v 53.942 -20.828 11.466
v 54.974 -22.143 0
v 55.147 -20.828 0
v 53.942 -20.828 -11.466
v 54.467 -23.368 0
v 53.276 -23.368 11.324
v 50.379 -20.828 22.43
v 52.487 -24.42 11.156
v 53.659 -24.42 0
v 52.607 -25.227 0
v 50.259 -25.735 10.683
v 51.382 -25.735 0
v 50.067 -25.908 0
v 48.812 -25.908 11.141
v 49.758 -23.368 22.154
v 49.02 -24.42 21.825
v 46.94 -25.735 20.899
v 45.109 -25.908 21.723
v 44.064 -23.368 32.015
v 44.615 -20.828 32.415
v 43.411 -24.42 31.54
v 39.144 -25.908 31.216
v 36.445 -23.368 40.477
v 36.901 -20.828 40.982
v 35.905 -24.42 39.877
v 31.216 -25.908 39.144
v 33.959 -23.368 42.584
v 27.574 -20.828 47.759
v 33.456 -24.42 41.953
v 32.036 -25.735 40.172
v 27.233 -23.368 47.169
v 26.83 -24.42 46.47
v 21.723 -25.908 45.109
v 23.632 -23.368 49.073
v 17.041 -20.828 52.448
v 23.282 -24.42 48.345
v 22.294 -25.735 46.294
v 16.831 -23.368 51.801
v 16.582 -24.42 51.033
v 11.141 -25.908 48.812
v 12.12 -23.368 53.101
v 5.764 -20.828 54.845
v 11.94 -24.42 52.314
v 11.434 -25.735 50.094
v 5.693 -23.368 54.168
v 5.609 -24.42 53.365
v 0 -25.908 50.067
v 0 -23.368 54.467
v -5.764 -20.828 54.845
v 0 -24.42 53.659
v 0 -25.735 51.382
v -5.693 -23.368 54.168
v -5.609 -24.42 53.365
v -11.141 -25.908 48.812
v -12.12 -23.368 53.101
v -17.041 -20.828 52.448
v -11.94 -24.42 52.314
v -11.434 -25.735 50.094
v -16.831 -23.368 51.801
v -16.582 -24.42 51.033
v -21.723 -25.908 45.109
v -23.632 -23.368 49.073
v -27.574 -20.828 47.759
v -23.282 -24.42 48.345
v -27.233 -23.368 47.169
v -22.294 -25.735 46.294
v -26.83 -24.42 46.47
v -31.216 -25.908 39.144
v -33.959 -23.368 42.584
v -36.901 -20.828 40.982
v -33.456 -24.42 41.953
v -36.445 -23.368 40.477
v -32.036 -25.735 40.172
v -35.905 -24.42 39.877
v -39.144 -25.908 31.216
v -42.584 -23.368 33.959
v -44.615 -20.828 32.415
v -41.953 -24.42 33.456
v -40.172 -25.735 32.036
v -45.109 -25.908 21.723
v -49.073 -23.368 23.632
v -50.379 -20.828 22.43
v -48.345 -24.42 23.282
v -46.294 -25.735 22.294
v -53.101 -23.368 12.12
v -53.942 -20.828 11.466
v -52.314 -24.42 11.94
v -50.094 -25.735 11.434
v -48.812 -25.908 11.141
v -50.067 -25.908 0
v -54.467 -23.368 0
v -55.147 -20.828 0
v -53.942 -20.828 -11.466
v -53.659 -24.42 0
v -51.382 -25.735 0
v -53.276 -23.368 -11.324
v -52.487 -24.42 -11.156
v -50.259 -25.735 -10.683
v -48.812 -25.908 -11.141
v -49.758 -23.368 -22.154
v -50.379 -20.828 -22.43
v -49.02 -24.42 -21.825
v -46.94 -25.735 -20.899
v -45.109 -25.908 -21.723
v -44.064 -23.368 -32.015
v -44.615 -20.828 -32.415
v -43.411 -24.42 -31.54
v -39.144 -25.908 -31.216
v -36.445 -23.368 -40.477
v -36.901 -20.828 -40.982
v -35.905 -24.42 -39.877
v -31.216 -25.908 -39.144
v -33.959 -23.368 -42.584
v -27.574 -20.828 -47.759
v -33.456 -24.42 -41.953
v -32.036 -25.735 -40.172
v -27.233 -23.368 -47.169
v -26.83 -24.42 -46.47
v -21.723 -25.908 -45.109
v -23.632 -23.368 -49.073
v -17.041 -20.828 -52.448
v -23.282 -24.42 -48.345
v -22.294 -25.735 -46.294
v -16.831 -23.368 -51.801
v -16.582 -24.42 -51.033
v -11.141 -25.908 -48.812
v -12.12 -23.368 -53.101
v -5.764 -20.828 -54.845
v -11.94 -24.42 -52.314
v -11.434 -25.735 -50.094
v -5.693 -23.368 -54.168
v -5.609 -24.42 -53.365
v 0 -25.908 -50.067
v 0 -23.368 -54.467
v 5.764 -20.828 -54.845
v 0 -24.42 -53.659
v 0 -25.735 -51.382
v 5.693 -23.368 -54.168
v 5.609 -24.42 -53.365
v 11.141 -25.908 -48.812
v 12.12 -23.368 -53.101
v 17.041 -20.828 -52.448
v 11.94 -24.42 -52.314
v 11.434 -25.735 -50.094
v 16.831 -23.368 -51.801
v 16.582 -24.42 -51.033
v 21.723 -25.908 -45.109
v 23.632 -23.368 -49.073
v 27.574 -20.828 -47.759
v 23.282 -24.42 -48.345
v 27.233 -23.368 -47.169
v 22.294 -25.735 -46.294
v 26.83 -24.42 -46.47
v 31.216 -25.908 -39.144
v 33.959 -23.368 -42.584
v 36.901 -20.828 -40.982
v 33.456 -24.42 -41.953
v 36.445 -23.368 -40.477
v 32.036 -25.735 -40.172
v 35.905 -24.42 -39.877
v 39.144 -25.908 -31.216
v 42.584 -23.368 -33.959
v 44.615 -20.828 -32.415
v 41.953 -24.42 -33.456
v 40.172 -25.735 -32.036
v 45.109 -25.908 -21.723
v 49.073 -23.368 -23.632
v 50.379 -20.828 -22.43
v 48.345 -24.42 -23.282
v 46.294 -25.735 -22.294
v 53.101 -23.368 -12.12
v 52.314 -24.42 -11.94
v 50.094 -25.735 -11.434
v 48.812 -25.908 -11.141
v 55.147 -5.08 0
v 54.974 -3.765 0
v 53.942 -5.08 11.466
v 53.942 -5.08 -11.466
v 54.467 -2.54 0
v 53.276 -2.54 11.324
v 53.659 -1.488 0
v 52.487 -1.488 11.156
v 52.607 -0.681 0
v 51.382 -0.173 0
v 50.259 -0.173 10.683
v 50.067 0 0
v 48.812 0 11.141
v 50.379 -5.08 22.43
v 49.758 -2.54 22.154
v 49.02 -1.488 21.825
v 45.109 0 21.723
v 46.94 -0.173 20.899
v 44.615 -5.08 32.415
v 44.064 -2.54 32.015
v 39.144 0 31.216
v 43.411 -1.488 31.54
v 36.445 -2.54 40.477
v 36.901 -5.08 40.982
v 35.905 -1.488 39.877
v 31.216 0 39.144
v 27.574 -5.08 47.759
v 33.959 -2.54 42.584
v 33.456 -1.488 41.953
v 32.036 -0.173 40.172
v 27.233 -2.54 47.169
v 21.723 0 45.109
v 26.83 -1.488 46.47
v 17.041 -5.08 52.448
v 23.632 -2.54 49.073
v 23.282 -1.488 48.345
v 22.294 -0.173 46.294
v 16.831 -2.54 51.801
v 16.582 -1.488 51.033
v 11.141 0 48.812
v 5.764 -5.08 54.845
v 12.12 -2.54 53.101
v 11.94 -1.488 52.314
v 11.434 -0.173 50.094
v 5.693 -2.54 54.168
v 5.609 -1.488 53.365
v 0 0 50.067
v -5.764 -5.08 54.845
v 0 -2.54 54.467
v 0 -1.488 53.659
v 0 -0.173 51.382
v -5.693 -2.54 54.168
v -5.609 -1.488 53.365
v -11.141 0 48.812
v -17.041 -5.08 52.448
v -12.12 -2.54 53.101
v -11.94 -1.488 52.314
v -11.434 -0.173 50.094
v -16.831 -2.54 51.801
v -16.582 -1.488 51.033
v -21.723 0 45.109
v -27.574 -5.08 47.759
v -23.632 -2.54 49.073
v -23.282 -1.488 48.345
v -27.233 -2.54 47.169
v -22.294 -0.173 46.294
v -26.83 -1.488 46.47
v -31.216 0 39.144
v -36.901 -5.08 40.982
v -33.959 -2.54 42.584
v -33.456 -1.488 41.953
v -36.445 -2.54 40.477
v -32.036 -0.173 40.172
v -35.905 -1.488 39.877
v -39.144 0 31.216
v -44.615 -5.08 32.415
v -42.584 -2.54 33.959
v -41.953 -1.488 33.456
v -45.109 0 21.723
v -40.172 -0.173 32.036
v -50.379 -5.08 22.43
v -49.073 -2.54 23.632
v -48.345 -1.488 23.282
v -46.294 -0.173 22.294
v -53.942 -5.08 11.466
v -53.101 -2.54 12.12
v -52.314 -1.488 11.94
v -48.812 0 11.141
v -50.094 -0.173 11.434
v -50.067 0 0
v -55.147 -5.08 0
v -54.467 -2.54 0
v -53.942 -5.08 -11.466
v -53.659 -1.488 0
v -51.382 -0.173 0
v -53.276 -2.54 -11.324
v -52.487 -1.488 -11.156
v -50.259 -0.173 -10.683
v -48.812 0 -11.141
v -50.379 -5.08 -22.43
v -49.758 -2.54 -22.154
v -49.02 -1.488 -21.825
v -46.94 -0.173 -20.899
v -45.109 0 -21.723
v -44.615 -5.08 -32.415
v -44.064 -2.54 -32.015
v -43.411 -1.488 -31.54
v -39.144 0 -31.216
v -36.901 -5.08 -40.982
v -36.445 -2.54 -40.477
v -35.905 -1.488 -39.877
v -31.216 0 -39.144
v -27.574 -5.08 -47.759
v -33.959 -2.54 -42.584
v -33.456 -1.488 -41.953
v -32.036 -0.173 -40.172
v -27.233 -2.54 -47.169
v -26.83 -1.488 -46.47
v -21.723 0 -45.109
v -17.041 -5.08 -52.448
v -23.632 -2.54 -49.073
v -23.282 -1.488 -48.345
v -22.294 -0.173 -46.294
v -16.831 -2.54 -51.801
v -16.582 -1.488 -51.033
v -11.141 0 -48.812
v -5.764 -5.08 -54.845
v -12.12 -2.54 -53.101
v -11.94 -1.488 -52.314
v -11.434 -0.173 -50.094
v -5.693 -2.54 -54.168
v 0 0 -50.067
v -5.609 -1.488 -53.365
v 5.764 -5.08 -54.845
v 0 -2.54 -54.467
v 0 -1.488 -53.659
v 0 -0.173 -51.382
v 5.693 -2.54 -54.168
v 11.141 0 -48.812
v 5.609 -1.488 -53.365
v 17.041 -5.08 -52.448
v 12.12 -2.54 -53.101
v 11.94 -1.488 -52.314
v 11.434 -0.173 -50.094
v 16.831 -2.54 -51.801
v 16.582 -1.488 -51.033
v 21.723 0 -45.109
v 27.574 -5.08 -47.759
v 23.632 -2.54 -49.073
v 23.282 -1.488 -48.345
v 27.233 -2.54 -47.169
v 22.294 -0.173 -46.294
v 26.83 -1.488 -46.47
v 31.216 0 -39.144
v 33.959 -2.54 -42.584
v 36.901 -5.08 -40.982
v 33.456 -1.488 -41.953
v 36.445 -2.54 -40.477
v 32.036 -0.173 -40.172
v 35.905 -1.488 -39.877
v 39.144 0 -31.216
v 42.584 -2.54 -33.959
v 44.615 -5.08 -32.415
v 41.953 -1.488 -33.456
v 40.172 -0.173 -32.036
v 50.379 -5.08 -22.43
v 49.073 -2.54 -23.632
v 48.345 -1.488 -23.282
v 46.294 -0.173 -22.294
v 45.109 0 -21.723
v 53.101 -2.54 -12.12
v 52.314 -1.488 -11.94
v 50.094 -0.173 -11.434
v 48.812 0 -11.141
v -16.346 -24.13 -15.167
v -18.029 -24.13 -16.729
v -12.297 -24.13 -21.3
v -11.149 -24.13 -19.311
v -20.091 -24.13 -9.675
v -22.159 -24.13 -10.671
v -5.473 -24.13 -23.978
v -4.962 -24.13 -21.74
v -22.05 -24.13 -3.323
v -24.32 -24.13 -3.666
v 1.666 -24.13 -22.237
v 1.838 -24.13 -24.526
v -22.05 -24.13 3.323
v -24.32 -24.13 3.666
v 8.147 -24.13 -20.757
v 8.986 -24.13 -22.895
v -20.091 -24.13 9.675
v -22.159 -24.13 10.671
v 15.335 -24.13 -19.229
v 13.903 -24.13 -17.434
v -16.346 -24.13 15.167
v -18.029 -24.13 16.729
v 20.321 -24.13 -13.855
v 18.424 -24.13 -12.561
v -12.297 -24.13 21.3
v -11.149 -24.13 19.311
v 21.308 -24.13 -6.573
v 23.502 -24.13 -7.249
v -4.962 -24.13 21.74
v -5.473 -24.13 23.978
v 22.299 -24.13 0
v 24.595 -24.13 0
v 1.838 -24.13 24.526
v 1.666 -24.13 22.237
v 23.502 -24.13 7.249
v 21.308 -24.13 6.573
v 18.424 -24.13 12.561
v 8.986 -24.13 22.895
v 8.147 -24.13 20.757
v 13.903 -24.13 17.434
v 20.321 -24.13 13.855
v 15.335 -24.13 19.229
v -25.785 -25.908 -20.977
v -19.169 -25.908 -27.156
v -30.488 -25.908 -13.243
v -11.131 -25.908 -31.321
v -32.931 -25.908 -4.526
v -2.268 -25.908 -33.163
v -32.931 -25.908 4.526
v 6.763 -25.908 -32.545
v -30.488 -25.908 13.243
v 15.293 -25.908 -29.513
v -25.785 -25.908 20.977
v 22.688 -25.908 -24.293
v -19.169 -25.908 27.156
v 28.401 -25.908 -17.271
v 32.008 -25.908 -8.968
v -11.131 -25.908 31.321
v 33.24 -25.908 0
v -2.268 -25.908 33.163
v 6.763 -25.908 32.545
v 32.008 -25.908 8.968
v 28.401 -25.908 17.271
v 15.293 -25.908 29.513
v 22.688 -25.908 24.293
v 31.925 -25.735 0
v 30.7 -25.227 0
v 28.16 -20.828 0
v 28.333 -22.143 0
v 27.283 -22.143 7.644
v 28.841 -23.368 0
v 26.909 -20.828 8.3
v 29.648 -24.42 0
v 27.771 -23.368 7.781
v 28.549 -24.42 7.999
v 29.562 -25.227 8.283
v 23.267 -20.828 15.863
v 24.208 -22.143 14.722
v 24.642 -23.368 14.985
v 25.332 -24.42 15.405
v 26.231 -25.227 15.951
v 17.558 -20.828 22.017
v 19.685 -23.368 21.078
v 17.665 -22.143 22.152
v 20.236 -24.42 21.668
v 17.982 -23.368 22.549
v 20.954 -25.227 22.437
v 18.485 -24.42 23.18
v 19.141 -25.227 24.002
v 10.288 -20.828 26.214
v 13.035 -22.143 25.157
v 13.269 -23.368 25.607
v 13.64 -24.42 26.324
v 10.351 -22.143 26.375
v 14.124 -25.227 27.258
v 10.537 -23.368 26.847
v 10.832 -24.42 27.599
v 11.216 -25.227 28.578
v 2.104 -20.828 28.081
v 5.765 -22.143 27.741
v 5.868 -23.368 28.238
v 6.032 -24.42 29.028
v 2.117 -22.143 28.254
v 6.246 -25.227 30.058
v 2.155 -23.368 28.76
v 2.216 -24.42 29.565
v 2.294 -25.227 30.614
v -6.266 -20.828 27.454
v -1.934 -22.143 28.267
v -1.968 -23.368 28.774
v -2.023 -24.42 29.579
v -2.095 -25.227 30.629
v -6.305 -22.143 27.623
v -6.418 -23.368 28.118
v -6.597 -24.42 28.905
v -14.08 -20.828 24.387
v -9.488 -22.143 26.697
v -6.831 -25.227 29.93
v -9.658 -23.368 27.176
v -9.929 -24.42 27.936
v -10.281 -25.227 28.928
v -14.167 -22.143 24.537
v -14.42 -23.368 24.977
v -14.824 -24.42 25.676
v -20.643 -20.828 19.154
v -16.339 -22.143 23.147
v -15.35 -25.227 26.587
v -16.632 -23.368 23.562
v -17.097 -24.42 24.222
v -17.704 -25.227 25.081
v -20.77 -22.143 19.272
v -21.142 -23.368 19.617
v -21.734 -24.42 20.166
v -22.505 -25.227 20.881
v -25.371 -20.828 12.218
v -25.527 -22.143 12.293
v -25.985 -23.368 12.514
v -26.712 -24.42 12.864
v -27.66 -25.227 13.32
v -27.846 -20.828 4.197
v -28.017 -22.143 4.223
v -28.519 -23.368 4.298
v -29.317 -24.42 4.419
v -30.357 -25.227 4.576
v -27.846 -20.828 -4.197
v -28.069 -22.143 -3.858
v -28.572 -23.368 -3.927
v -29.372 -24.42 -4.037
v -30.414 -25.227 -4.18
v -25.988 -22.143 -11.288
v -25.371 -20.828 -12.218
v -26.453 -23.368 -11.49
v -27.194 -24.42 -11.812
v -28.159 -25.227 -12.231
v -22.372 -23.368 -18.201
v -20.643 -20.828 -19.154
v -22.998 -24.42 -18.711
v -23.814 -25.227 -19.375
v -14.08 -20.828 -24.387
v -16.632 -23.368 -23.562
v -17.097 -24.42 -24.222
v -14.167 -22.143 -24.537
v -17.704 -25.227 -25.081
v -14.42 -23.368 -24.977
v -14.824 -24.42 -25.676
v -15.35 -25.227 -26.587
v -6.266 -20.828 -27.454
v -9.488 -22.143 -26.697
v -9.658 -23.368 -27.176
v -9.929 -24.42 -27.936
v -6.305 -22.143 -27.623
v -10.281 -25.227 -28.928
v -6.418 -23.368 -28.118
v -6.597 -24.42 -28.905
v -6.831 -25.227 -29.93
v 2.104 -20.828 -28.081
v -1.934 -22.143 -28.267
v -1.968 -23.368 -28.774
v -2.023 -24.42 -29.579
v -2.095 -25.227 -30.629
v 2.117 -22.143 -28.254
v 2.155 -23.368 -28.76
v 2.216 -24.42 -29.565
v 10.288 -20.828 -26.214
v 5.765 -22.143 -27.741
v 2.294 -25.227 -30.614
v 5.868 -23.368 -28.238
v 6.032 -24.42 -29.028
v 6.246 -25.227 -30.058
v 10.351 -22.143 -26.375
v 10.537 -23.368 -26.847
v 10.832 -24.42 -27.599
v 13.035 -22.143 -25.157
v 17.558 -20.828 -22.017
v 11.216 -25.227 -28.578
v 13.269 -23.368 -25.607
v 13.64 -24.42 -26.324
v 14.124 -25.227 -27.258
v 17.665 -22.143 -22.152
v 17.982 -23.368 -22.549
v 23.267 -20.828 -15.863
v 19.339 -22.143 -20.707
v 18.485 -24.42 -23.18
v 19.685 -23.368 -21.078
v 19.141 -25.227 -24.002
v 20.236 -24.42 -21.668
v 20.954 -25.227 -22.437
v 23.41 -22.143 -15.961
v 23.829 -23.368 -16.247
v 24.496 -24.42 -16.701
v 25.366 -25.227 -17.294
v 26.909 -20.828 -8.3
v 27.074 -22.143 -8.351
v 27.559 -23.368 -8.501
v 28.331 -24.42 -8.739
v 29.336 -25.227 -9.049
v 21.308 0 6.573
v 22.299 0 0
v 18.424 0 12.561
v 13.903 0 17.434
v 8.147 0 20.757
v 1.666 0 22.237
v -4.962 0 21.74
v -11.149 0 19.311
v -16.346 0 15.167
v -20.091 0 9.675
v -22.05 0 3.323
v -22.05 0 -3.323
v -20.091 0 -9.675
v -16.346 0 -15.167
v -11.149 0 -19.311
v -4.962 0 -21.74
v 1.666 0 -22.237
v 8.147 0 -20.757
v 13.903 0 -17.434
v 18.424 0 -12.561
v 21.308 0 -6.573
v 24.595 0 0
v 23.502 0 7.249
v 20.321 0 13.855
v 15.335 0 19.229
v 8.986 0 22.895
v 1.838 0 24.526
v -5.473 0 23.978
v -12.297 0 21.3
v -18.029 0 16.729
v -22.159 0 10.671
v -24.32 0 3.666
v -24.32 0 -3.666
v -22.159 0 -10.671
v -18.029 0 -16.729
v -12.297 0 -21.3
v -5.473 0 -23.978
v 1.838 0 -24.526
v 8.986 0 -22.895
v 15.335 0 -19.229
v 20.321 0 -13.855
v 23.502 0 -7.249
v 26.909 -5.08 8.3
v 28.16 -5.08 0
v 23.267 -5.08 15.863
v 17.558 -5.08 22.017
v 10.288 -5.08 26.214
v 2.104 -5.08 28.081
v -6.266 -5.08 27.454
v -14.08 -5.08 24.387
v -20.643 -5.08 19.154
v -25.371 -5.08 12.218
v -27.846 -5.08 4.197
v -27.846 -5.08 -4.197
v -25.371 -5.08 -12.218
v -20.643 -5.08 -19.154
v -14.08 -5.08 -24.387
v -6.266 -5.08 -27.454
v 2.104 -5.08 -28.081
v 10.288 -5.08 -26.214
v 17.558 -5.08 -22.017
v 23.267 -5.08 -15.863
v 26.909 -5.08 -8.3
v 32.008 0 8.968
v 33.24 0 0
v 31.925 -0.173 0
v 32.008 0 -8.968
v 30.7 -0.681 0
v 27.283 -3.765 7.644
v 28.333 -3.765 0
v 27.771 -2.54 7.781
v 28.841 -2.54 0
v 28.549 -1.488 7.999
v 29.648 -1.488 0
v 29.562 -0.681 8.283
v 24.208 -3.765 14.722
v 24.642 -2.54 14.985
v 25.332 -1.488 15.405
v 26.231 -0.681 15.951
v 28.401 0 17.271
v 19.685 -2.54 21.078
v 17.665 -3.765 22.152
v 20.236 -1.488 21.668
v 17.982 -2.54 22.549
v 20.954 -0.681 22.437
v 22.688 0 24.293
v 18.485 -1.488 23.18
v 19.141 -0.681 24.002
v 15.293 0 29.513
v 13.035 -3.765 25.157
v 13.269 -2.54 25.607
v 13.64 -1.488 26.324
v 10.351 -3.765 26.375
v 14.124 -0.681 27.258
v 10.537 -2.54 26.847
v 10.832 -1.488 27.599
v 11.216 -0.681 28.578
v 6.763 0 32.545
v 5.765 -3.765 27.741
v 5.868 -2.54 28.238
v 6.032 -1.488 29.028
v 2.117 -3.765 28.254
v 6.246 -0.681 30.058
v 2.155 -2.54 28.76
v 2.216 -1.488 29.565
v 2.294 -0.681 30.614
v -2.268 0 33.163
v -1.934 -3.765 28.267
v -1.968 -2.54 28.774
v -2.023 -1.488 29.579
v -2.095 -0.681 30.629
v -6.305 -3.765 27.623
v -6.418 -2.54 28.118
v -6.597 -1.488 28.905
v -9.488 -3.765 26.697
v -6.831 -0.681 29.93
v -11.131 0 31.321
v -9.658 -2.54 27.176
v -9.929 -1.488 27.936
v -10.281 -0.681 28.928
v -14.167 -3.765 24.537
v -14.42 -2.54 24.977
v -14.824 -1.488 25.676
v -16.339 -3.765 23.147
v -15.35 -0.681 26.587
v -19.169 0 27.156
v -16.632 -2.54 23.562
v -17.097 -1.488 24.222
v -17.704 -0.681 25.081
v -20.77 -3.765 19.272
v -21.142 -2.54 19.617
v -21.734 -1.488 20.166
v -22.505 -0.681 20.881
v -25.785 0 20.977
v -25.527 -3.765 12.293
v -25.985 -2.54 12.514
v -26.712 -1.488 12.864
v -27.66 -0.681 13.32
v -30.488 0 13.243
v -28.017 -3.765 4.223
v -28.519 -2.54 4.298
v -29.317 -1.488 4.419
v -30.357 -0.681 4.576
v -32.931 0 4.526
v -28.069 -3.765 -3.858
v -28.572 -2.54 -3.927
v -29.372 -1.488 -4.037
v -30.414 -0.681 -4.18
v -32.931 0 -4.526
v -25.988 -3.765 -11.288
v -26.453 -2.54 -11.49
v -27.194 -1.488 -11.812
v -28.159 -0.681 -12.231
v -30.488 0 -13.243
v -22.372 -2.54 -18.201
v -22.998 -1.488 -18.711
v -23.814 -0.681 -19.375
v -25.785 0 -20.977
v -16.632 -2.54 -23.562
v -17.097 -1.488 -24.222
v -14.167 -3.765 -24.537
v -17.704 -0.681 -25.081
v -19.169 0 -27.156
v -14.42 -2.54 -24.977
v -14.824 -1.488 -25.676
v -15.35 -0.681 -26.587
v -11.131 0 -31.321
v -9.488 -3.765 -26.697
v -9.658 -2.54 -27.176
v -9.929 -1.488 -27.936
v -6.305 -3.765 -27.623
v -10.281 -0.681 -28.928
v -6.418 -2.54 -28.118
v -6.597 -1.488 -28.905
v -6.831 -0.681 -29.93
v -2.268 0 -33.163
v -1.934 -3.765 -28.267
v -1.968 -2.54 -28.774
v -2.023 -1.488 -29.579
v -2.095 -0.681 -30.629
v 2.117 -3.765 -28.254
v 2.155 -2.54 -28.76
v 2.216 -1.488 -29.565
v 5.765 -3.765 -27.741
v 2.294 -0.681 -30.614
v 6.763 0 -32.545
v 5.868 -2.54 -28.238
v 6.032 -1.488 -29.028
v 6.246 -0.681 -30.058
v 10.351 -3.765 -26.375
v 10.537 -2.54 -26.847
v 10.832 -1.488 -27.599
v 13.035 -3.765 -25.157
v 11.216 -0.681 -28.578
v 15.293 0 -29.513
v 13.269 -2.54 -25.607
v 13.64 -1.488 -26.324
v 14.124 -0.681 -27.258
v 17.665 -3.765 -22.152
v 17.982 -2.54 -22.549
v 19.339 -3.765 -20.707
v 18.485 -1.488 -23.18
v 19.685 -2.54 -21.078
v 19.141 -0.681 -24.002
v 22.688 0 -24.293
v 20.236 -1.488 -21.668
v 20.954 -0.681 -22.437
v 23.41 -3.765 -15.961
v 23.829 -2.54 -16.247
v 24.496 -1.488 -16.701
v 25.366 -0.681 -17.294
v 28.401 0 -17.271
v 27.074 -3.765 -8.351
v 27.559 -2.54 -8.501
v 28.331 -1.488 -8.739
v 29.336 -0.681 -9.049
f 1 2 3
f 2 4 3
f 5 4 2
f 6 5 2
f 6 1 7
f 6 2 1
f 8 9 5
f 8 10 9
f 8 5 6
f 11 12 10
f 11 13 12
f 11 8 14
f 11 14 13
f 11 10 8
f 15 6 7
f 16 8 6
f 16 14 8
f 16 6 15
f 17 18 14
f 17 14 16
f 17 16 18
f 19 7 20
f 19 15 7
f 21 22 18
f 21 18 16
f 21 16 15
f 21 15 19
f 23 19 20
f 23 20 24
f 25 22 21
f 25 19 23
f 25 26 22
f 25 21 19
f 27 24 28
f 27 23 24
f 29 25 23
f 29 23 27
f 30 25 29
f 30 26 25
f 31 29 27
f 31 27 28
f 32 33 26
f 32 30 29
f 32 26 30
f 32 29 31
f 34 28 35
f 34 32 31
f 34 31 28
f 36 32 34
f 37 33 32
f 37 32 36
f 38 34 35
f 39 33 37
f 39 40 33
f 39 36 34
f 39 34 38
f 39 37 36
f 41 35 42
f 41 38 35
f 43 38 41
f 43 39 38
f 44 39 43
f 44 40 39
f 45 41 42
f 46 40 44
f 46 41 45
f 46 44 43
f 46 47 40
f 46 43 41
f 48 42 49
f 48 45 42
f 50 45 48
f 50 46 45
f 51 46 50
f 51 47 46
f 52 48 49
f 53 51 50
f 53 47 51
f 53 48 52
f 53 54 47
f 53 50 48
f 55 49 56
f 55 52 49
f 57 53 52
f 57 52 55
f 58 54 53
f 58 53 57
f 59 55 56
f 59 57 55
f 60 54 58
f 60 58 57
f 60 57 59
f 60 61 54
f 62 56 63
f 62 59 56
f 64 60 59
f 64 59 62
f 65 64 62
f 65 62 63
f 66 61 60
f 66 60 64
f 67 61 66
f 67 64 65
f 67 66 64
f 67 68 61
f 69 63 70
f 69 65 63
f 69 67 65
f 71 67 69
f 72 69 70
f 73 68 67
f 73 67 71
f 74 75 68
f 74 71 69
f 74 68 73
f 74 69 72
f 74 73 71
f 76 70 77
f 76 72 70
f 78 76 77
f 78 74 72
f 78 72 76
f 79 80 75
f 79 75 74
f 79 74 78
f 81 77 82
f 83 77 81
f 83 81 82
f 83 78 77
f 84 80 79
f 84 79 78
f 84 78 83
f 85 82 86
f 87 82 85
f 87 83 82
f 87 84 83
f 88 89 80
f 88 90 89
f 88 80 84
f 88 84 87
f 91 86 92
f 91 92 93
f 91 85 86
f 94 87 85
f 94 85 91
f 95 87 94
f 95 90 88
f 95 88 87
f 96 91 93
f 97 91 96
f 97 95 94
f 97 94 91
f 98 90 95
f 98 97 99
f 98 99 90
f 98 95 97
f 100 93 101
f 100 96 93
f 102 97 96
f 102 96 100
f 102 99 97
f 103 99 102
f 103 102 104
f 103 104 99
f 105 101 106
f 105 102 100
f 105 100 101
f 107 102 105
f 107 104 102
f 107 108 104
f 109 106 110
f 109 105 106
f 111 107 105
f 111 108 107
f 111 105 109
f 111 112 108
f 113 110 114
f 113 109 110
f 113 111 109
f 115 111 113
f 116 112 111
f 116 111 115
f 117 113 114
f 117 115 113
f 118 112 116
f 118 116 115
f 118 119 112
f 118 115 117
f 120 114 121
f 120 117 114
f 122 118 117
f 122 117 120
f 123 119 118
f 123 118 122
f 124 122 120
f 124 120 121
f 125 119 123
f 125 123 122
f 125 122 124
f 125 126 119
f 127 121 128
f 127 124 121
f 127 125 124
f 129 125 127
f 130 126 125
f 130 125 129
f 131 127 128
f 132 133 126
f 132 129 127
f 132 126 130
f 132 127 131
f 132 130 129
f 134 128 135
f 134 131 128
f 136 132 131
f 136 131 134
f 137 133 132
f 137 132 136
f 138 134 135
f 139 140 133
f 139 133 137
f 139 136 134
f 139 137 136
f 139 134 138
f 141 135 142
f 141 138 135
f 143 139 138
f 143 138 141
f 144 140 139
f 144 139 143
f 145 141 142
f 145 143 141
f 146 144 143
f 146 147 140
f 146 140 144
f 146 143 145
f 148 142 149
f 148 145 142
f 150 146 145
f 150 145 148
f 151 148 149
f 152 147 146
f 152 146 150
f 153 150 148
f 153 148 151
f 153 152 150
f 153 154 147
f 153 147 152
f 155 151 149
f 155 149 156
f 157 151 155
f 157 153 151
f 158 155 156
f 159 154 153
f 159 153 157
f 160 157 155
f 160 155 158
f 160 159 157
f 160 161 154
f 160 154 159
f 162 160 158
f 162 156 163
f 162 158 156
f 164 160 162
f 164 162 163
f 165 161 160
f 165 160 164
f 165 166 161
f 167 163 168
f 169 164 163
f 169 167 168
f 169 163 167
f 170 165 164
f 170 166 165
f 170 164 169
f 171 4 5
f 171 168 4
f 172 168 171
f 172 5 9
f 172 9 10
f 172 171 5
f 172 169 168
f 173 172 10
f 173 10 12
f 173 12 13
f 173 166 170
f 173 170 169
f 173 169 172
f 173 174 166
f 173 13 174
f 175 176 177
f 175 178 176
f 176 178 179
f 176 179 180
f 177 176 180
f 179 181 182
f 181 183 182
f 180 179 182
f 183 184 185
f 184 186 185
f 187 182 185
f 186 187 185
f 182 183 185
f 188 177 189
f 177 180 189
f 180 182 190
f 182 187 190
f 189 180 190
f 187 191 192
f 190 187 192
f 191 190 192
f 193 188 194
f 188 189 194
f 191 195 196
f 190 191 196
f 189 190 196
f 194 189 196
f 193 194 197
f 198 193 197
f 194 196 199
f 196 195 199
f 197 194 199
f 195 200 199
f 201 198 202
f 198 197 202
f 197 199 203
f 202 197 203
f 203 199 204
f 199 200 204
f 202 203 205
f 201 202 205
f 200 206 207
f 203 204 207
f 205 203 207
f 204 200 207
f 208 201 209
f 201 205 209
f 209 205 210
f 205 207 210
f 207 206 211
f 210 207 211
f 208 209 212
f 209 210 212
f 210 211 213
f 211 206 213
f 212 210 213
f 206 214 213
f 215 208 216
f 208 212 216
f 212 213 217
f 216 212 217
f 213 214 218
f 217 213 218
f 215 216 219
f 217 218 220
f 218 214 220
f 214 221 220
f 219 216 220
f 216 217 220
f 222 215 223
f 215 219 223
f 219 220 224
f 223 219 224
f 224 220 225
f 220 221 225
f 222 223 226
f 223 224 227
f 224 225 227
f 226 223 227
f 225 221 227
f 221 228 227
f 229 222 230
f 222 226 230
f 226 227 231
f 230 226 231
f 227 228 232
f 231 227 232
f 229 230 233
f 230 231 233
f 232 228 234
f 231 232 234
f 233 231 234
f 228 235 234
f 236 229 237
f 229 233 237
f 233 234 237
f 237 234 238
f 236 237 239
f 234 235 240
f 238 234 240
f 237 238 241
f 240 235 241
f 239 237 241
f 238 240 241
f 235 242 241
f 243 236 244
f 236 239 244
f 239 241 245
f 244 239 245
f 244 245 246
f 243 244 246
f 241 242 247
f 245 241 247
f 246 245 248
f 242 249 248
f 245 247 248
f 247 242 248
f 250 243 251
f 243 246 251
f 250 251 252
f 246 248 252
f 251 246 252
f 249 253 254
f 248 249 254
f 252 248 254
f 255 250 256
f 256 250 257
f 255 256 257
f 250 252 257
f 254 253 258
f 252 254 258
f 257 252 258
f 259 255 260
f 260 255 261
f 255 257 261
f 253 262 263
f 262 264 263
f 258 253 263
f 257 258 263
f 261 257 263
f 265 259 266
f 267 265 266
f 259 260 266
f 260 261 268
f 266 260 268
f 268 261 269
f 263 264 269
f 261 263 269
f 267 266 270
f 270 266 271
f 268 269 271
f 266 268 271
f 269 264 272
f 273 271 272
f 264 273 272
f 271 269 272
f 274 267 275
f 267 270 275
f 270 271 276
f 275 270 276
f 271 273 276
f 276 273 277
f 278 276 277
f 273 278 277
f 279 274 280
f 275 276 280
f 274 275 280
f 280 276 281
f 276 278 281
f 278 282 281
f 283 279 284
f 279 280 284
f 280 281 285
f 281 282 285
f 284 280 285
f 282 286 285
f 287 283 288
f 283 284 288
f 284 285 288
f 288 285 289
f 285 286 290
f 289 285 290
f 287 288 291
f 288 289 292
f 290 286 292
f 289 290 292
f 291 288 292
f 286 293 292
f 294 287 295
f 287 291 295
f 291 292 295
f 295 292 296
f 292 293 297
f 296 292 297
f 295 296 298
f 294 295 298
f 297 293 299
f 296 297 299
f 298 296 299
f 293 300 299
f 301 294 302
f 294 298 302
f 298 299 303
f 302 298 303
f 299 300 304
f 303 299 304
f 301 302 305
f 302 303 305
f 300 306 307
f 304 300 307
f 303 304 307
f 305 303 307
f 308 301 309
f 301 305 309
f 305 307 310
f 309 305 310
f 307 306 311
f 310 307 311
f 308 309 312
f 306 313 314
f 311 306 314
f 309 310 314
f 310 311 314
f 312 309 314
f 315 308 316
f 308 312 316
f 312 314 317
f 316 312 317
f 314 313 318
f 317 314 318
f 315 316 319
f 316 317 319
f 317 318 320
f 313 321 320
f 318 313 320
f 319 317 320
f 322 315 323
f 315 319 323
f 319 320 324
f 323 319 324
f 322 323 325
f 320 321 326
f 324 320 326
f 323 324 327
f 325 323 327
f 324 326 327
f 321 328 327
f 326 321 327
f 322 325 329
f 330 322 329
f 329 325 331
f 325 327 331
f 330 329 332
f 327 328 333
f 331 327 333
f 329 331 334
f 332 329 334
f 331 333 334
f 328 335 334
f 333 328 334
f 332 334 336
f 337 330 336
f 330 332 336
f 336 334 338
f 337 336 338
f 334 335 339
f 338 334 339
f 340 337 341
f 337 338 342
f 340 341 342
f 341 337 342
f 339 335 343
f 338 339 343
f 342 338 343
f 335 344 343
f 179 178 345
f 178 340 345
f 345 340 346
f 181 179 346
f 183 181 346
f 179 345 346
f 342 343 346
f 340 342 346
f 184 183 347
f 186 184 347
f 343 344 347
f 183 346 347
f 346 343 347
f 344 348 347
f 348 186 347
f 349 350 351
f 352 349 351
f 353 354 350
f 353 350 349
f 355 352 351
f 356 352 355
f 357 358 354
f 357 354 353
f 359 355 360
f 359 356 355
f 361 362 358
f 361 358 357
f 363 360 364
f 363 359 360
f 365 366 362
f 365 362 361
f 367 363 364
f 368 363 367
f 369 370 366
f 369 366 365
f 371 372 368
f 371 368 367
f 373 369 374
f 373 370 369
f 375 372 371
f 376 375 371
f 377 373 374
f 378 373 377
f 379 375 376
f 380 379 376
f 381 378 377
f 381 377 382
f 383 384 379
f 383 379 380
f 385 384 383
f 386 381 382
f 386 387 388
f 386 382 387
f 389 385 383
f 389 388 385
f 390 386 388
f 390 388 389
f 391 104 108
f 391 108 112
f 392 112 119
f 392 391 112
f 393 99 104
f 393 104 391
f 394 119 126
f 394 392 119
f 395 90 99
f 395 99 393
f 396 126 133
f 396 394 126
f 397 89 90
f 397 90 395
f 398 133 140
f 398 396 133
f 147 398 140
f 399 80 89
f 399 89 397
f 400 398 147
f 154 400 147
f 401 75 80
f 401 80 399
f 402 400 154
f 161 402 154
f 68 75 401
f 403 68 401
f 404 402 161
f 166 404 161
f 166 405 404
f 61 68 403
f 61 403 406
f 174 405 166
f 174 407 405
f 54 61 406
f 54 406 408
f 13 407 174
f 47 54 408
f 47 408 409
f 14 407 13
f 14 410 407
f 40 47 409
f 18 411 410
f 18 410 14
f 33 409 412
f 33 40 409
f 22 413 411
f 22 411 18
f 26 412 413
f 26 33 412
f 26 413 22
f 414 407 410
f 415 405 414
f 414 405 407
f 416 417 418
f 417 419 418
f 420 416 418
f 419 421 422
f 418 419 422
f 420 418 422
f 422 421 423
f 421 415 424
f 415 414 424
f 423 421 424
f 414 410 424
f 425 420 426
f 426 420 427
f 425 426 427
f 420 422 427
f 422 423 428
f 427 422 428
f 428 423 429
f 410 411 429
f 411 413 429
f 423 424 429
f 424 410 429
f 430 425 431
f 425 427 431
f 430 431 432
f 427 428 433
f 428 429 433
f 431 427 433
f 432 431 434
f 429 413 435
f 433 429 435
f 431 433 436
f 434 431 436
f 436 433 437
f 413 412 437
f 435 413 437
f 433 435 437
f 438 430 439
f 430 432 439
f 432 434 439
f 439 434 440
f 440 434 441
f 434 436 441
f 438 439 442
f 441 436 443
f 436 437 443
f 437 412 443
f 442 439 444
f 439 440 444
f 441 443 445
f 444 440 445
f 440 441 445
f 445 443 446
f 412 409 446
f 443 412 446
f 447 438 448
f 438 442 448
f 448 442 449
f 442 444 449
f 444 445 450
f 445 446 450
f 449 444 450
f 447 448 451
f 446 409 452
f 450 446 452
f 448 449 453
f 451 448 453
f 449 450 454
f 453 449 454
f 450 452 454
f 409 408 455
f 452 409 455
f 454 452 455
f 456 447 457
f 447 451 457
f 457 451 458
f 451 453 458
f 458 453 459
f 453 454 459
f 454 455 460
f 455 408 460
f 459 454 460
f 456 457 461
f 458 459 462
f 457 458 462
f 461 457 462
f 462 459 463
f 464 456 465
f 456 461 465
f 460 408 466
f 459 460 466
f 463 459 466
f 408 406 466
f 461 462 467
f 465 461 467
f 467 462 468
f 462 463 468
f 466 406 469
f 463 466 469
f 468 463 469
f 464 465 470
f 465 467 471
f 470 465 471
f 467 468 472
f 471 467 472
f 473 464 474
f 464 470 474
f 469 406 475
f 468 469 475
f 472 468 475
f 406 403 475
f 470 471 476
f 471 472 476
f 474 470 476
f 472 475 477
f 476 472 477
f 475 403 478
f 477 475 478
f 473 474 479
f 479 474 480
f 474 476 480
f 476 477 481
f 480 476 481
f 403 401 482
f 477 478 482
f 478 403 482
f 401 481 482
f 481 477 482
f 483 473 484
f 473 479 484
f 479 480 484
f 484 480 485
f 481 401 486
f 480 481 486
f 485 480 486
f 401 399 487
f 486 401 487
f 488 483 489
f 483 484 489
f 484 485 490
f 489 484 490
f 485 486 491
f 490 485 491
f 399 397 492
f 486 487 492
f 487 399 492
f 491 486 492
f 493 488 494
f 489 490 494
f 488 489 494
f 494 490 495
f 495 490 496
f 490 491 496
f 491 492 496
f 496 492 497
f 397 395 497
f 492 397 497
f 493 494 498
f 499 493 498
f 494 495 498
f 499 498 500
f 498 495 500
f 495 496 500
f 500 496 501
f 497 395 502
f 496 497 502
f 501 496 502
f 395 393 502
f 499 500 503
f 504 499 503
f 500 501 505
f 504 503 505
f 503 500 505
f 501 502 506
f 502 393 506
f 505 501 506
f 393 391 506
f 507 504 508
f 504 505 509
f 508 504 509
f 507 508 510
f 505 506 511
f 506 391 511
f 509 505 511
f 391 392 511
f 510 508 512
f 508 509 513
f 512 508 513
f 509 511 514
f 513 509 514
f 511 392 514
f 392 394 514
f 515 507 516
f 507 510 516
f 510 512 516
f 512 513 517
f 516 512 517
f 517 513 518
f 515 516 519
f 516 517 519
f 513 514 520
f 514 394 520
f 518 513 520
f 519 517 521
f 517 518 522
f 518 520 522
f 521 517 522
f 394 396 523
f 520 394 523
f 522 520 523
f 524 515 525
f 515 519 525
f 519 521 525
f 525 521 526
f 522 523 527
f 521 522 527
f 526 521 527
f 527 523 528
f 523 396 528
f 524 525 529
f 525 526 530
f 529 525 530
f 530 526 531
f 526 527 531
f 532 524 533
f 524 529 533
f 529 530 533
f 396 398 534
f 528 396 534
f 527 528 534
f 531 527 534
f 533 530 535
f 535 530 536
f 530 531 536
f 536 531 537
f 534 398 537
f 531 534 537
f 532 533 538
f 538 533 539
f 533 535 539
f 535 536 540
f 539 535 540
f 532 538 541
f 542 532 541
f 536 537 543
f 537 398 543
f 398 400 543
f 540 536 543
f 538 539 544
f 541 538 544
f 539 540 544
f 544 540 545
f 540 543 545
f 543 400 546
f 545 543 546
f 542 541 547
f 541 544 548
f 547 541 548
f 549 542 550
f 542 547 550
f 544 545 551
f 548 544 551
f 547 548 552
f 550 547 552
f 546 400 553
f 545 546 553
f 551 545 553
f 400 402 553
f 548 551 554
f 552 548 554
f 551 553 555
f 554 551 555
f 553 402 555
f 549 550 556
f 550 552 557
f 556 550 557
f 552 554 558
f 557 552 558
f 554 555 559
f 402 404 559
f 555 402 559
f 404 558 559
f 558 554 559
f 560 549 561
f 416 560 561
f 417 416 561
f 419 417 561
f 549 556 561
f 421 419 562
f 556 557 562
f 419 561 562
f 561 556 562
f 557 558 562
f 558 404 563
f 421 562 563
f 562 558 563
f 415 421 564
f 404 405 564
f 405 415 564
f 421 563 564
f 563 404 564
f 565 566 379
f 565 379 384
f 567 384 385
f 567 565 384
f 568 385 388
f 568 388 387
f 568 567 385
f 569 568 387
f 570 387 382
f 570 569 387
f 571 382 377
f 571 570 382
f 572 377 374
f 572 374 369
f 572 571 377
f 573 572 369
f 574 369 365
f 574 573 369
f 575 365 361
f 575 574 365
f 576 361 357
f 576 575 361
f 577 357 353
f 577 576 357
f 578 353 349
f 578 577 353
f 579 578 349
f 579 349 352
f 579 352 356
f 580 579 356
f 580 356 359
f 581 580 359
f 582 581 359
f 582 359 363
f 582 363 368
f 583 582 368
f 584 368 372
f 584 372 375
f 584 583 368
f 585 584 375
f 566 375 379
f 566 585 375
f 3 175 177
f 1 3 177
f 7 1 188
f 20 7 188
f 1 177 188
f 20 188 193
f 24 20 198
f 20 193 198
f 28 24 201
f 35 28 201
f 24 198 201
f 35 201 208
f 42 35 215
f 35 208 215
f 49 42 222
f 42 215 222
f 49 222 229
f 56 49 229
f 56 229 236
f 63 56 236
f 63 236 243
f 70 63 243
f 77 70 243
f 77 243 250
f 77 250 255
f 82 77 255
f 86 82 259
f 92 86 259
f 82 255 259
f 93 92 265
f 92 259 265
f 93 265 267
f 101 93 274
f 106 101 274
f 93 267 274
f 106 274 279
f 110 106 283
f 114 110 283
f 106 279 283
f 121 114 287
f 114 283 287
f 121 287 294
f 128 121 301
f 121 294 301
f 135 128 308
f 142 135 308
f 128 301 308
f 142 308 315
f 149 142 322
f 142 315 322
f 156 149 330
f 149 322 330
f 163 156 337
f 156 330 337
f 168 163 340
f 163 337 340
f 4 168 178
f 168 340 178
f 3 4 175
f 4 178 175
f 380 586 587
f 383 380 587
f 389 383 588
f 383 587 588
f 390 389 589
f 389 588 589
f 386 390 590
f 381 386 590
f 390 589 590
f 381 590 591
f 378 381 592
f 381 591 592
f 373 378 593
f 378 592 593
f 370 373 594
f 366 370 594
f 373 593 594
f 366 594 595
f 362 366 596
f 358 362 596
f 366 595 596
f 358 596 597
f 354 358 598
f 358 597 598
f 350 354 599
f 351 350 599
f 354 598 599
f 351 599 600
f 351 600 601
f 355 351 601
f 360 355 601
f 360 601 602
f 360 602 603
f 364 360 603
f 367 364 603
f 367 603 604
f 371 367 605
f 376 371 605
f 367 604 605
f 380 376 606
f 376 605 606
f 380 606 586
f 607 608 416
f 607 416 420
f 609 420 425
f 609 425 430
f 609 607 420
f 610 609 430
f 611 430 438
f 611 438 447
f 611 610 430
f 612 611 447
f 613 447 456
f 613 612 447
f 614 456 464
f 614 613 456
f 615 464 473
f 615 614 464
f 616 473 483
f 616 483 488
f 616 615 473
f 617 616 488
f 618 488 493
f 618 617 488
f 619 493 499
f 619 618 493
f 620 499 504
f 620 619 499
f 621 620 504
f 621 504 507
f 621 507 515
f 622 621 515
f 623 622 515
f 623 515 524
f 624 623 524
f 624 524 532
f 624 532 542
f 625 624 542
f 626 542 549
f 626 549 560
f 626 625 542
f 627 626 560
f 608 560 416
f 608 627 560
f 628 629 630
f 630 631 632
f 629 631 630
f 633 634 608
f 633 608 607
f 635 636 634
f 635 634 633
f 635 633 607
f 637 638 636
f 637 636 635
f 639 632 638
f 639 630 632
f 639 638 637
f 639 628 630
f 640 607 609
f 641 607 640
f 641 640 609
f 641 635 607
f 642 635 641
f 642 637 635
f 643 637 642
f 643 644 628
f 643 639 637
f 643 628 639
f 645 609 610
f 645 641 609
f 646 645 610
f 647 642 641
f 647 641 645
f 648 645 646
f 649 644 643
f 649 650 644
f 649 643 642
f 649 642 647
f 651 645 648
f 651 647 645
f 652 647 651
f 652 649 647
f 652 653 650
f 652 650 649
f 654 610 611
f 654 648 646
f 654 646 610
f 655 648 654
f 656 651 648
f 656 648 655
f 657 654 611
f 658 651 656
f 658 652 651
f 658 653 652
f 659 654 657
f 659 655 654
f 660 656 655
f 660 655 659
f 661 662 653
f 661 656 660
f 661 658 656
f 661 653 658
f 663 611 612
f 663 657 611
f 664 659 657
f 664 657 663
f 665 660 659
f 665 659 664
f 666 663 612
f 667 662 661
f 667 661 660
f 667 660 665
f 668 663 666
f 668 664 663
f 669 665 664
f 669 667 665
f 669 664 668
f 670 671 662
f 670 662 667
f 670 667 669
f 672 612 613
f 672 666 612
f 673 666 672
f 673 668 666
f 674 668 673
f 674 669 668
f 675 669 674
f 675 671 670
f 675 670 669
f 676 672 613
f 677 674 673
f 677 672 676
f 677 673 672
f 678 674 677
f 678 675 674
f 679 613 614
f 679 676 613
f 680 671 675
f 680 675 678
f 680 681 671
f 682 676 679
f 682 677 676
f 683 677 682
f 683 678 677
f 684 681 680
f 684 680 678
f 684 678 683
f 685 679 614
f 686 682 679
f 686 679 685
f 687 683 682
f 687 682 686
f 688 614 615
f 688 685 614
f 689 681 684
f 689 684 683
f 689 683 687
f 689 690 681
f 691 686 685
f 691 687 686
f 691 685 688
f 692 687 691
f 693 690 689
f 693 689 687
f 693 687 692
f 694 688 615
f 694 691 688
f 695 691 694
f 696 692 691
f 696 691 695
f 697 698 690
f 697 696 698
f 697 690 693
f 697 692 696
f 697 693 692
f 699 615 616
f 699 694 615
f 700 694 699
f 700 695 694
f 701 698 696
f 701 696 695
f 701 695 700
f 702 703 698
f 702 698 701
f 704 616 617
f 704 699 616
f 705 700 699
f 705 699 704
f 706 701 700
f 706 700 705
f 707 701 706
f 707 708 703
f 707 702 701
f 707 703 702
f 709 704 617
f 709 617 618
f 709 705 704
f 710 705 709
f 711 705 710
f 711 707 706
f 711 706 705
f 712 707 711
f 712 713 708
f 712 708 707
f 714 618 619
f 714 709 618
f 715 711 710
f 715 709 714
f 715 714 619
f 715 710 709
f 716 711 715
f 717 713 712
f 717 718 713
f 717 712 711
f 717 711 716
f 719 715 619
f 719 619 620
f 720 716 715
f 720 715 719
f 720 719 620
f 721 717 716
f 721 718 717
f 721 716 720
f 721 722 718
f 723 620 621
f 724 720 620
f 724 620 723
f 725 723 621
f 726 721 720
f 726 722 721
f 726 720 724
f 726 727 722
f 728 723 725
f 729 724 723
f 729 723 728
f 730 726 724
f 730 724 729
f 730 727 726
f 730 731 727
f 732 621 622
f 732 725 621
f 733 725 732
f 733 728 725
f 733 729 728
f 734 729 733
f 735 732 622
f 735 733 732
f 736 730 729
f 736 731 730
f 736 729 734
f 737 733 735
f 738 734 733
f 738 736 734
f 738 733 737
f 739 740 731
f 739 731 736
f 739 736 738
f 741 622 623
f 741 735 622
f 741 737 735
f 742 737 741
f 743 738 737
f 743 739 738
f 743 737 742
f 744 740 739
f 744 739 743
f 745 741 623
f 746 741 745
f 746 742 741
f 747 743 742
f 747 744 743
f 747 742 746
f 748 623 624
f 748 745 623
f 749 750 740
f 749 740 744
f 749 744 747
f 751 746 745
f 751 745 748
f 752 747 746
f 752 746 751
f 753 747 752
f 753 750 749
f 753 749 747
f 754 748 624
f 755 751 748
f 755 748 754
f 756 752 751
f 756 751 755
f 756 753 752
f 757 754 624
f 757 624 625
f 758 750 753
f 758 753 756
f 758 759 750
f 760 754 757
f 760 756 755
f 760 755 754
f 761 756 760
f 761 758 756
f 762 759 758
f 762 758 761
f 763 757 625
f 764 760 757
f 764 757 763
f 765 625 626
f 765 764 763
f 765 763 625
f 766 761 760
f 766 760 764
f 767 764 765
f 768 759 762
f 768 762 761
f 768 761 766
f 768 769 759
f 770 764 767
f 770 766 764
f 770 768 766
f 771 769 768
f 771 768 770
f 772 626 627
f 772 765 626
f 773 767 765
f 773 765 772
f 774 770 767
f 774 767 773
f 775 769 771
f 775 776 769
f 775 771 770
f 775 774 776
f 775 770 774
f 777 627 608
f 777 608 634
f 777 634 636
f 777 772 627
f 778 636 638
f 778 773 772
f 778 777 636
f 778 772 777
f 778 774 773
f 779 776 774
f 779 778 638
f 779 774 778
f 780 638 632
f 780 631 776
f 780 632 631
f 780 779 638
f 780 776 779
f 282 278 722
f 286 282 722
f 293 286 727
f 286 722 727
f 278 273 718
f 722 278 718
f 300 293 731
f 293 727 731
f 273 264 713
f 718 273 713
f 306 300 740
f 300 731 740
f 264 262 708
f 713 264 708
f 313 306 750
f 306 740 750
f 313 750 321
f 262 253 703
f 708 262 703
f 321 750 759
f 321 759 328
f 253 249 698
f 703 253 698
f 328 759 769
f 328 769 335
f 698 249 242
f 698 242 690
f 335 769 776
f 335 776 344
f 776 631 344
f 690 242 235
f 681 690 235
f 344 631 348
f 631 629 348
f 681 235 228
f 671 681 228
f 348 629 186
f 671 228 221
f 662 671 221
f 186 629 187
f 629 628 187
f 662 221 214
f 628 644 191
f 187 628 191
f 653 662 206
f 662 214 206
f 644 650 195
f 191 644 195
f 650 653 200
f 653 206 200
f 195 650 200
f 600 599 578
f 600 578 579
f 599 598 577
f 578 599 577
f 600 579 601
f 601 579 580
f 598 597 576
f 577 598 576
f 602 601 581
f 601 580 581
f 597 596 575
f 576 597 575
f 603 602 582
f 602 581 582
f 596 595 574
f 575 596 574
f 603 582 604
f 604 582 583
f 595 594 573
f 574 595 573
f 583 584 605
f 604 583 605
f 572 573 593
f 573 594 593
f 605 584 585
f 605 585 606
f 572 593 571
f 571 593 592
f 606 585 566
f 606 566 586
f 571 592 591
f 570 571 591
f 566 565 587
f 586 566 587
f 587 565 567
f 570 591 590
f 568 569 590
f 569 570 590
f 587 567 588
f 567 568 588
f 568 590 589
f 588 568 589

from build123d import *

# Parameters (mm, degrees)
F0_R     = 55.147219
F0_R_2   = 28.160163
F1_DEPTH = 25.908
F2_R     = 5.08
F3_R     = 24.594966
F3_R_2   = 22.298934
F4_DEPTH = 24.13


with BuildPart() as f1:
    # F0 (on Front) → F1 (new body)
    with BuildSketch(Plane.XZ):
        Circle(F0_R)
        Circle(F0_R_2, mode=Mode.SUBTRACT)
    extrude(amount=F1_DEPTH)

    # F2
    f2_edges = [f1.edges().sort_by_distance(p)[0] for p in [
        (-28.160163, -25.908, 0),
        (-55.147219, -25.908, 0),
        (-55.147219, 0, 0),
        (-28.160163, 0, 0),
    ]]
    fillet(f2_edges, radius=F2_R)


with BuildPart() as f4:
    # F3 (on Front) → F4 (new body)
    with BuildSketch(Plane.XZ):
        Circle(F3_R)
        Circle(F3_R_2, mode=Mode.SUBTRACT)
    extrude(amount=F4_DEPTH)


solid = Compound([f1.part, f4.part])
